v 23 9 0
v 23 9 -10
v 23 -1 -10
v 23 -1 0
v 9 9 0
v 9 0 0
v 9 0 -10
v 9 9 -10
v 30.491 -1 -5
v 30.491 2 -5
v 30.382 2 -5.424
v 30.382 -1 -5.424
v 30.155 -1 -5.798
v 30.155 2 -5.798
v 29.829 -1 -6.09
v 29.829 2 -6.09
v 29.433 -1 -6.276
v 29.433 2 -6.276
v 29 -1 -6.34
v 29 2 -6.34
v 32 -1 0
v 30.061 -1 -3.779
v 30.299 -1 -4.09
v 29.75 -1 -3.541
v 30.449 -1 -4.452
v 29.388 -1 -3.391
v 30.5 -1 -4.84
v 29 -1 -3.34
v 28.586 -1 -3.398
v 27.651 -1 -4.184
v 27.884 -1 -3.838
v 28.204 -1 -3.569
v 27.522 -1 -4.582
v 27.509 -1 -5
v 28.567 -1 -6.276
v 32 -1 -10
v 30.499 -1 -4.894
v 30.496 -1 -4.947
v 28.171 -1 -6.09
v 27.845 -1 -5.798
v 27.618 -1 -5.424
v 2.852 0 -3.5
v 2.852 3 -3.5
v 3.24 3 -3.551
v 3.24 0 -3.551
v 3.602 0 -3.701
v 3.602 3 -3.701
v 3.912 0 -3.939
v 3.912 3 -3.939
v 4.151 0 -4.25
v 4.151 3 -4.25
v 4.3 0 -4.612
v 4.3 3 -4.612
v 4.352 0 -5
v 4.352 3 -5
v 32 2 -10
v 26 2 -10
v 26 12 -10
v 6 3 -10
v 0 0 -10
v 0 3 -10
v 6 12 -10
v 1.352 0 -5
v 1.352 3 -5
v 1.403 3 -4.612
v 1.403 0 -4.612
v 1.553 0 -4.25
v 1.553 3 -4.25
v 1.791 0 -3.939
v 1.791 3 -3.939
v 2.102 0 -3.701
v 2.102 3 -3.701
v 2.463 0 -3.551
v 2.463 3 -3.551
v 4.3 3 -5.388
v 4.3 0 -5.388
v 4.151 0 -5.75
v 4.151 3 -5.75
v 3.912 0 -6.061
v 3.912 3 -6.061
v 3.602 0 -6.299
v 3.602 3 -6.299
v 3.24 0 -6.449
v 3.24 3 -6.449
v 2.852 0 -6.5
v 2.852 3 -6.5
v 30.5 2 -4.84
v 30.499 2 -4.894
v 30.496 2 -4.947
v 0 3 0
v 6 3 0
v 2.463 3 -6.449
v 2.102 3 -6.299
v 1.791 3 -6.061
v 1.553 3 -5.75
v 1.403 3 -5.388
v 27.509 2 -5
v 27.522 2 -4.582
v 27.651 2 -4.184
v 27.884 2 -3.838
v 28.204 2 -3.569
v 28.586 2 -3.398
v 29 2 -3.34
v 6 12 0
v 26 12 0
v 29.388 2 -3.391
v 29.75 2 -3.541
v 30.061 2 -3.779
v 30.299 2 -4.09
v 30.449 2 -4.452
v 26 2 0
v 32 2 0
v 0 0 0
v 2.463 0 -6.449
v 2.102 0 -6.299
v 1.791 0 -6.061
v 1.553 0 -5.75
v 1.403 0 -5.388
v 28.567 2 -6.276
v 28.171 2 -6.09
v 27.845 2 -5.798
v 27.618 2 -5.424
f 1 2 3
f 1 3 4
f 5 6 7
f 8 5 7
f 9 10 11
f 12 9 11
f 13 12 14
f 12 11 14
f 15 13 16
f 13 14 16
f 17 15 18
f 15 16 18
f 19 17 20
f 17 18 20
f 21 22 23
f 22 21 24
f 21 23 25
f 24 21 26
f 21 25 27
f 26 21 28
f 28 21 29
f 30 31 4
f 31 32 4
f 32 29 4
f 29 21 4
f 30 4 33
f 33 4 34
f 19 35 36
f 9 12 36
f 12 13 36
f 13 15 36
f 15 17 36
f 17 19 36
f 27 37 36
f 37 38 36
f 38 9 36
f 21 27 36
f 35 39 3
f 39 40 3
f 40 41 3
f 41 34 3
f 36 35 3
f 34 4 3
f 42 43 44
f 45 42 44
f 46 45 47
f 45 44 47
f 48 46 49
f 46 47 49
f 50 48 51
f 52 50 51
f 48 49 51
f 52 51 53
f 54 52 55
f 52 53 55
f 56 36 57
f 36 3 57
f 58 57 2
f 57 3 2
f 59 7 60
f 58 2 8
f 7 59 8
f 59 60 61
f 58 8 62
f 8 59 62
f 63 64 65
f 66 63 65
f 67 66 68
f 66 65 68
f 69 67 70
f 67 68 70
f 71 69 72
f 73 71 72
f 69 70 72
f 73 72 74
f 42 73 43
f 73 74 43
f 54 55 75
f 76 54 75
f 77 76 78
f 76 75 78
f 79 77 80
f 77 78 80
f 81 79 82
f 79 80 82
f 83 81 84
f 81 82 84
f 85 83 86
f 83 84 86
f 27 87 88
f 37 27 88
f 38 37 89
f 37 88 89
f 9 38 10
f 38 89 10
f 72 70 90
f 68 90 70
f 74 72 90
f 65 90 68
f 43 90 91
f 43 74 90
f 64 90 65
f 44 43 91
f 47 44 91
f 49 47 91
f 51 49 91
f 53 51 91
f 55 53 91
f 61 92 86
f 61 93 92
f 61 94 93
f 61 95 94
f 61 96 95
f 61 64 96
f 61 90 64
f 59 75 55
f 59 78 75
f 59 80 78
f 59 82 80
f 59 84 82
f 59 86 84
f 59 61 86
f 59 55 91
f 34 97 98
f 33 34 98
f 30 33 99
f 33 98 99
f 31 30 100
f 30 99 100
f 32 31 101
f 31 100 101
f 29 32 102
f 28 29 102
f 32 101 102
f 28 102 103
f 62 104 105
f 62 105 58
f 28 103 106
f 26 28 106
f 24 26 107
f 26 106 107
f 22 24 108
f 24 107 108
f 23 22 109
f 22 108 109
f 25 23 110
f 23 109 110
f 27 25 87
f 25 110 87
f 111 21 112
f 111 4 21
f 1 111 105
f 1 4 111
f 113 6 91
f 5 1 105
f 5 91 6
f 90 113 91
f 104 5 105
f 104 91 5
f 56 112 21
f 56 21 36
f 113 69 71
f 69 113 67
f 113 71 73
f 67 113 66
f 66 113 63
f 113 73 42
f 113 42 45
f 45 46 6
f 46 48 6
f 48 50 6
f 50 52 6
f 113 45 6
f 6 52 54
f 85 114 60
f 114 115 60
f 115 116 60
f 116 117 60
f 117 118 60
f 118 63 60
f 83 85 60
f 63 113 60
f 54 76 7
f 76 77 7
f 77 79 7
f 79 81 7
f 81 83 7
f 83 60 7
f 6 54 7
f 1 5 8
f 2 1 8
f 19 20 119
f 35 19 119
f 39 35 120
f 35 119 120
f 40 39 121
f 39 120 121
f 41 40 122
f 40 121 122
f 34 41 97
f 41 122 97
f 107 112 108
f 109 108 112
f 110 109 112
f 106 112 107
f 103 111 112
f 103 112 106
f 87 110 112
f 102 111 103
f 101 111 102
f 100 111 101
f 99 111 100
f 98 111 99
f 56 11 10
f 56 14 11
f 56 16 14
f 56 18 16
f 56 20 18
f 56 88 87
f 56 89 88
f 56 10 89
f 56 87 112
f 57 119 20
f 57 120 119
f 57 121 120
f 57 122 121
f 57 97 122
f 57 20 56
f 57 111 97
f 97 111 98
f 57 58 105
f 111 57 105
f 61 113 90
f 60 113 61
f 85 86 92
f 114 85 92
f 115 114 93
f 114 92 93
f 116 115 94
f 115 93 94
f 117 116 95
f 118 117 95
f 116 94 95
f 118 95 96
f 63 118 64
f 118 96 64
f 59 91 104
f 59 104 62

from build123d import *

# Parameters (mm, degrees)
SKETCH1_W           = 9
SKETCH1_H           = 10
BOSS_EXTRUDE1_DEPTH = 3
SKETCH2_W           = 3
SKETCH2_H           = 10
BOSS_EXTRUDE2_DEPTH = 9
SKETCH3_W           = 10
SKETCH3_H           = 3
BOSS_EXTRUDE3_DEPTH = 17
SKETCH4_W           = 3
SKETCH4_H           = 10
BOSS_EXTRUDE4_DEPTH = 10
SKETCH5_W           = 10
SKETCH5_H           = 3
BOSS_EXTRUDE5_DEPTH = 6
CUT_EXTRUDE1_DEPTH  = 6


with BuildPart() as part:
    # Sketch1 → Boss-Extrude1 (new body)
    with BuildSketch(Plane(origin=(0, 0, 0), x_dir=(1, 0, 0), z_dir=(0, 1, 0))):
        with Locations((4.5, 5)):
            Rectangle(SKETCH1_W, SKETCH1_H)
    extrude(amount=BOSS_EXTRUDE1_DEPTH)

    # Sketch2 → Boss-Extrude2 (add)
    with BuildSketch(Plane(origin=(0, 3, 0), x_dir=(1, 0, 0), z_dir=(0, 1, 0))):
        with Locations((7.5, 5)):
            Rectangle(SKETCH2_W, SKETCH2_H)
    extrude(amount=BOSS_EXTRUDE2_DEPTH)

    # Sketch3 → Boss-Extrude3 (add)
    with BuildSketch(Plane(origin=(9, 0, 0), x_dir=(0, 0, -1), z_dir=(1, 0, 0))):
        with Locations((5, 10.5)):
            Rectangle(SKETCH3_W, SKETCH3_H)
    extrude(amount=BOSS_EXTRUDE3_DEPTH)

    # Sketch4 → Boss-Extrude4 (add)
    with BuildSketch(Plane.XZ.offset(-9)):
        with Locations((24.5, -5)):
            Rectangle(SKETCH4_W, SKETCH4_H)
    extrude(amount=BOSS_EXTRUDE4_DEPTH)

    # Sketch5 → Boss-Extrude5 (add)
    with BuildSketch(Plane(origin=(26, 0, 0), x_dir=(0, 0, -1), z_dir=(1, 0, 0))):
        with Locations((5, 0.5)):
            Rectangle(SKETCH5_W, SKETCH5_H)
    extrude(amount=BOSS_EXTRUDE5_DEPTH)

    # Sketch6 → Cut-Extrude1 (cut)
    with BuildSketch(Plane(origin=(0, 3, 0), x_dir=(1, 0, 0), z_dir=(0, 1, 0))):
        with BuildLine():
            ThreePointArc((4.351556364, 5), (3.912216535, 6.060660172), (2.851556364, 6.5))
            Line((2.851556364, 6.5), (2.851556364, 5))
            Line((2.851556364, 5), (4.351556364, 5))
        make_face()
        with BuildLine():
            Line((2.851556364, 5), (2.851556364, 6.5))
            ThreePointArc((2.851556364, 6.5), (1.790896192, 6.060660172), (1.351556364, 5))
            Line((1.351556364, 5), (2.851556364, 5))
        make_face()
        with BuildLine():
            Line((4.351556364, 5), (2.851556364, 5))
            Line((2.851556364, 5), (2.851556364, 3.5))
            ThreePointArc((2.851556364, 3.5), (3.912216535, 3.939339828), (4.351556364, 5))
        make_face()
        with BuildLine():
            Line((2.851556364, 3.5), (2.851556364, 5))
            Line((2.851556364, 5), (1.351556364, 5))
            ThreePointArc((1.351556364, 5), (1.790896192, 3.939339828), (2.851556364, 3.5))
        make_face()
        with BuildLine():
            ThreePointArc((30.491456548, 5), (30.002546741, 5.955884174), (29, 6.340133291))
            Line((29, 6.340133291), (29, 5))
            Line((29, 5), (30.491456548, 5))
        make_face()
        with BuildLine():
            Line((29, 5), (29, 6.340133291))
            ThreePointArc((29, 6.340133291), (27.997453259, 5.955884174), (27.508543452, 5))
            Line((27.508543452, 5), (29, 5))
        make_face()
        with BuildLine():
            Line((30.491456548, 5), (29, 5))
            Line((29, 5), (29, 3.340133291))
            ThreePointArc((29, 3.340133291), (30.060660172, 3.779473119), (30.5, 4.840133291))
            ThreePointArc((30.5, 4.840133291), (30.497862614, 4.920180707), (30.491456548, 5))
        make_face()
        with BuildLine():
            Line((29, 3.340133291), (29, 5))
            Line((29, 5), (27.508543452, 5))
            ThreePointArc((27.508543452, 5), (27.884249118, 3.83758655), (29, 3.340133291))
        make_face()
    extrude(amount=-CUT_EXTRUDE1_DEPTH, mode=Mode.SUBTRACT)


solid = part.part
